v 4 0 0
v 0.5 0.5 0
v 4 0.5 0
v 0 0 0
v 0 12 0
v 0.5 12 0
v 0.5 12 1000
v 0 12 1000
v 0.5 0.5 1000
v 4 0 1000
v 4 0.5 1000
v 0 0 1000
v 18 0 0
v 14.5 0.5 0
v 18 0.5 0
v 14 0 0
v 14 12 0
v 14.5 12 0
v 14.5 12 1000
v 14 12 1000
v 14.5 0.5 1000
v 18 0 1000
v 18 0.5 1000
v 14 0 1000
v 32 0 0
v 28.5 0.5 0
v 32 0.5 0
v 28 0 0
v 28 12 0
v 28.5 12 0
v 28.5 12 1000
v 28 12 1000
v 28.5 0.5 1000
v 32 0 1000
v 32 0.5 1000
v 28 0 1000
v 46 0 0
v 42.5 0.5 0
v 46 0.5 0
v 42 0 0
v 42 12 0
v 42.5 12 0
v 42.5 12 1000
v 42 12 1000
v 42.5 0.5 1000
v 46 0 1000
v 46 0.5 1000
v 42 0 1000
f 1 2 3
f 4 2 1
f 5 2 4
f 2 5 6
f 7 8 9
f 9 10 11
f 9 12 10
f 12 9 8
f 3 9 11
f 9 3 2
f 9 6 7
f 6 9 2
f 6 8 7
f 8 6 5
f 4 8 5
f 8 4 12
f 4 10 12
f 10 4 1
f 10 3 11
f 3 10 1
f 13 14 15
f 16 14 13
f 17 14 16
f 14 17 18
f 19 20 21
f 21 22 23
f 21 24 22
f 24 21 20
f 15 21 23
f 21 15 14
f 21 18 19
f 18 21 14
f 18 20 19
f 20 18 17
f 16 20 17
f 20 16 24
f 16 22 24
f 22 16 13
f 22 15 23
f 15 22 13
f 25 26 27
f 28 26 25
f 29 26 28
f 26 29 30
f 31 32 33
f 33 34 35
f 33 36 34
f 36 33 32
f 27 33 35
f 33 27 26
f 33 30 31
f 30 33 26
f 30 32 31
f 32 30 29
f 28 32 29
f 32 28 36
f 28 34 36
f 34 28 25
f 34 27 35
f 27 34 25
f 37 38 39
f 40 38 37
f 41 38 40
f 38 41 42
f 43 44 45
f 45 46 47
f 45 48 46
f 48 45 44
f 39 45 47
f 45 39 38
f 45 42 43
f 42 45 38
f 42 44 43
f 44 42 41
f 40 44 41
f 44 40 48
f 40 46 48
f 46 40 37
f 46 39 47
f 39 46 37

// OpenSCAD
// file: Conductors/Common.scad
/**
 * Functions common to all conductors.
 */

/**
 * Draw a 3-dimensional single conductor.
 *
 * length: [number] The length of the conductor
 * current: [number] The electrical current to handle by the conductor
 */
module Conductor(length, current)
{
	linear_extrude(length)
	ConductorProfile(current);
}

/**
 * Draw a set of conductors based on given config.
 *
 * length: [number] The length of the conductors
 * config: [vector] A vector of currents, eg. [5, 5, 5] produces three conductors, each taking 5A
 * margin: [number] The distance between two vectors
 */
module Conductors(length, config, margin)
{
	for (current = config, index = [0 : len(config) - 1]) {
		offset = index*(margin + conductor_width());
		translate([offset, 0, 0])
		Conductor(length, current);
	}
}
// file: Conductors/L-Conductor.scad
/**
 * An L-shaped conductor.
 *
 * This file describes a Conductor, eg. a wire. It can base the shape of the
 * conductor on an electrical `current` that must be passed into the call
 * to the module.
 *
 * A conductor must provide the following interface:
 *   - ConductorProfile(current) [Module] Draws the profile of a single conductor on the XY-space
 *   - conductor_width() [Function] Returns the X-spread of a single conductor
 *   - conductor_height() [Function] Returns the Y-spread of a single conductor
 */

conductor_thickness = .5;

function conductor_width() = 4;
function conductor_height() = 12;

module ConductorProfile(current)
{
	union() {
		square([conductor_width(), conductor_thickness]);
		square([conductor_thickness, conductor_height()]);
	}
}

module Conductor(length)
{
	linear_extrude(length)
	ConductorProfile();
}
// main file
/**
 * In this main file, the entire installation is assembled.
 *
 * Default length unit is millimeters (mm).
 *
 */


/*
|--------------------------------------------------------------------------
| Module Selection
|--------------------------------------------------------------------------
|
| Load the library of components.
|
| Individual components can be swapped out with compatible replacements
| by stating a different file in the following lines.
|
*/
use <Conductors/L-Conductor.scad>;


/*
|--------------------------------------------------------------------------
| Includes
|--------------------------------------------------------------------------
|
| Load some mandatory modules and functions.
|
| These are assumed to be present, so do not change
| anything here, unless you know what you're doing!
|
*/
include <Conductors/Common.scad>;


/*
|--------------------------------------------------------------------------
| Configuration
|--------------------------------------------------------------------------
|
| The following parameters can be changed to influence the model.
|
*/
CONDUCTORS = [50, 100, 50, 50];
CONDUCTORS_MARGIN = 10;


/*
|--------------------------------------------------------------------------
| Assembly
|--------------------------------------------------------------------------
|
| Assemble the final design. This is where the actual model gets its shape.
|
*/
Conductors(1000, CONDUCTORS, CONDUCTORS_MARGIN);
